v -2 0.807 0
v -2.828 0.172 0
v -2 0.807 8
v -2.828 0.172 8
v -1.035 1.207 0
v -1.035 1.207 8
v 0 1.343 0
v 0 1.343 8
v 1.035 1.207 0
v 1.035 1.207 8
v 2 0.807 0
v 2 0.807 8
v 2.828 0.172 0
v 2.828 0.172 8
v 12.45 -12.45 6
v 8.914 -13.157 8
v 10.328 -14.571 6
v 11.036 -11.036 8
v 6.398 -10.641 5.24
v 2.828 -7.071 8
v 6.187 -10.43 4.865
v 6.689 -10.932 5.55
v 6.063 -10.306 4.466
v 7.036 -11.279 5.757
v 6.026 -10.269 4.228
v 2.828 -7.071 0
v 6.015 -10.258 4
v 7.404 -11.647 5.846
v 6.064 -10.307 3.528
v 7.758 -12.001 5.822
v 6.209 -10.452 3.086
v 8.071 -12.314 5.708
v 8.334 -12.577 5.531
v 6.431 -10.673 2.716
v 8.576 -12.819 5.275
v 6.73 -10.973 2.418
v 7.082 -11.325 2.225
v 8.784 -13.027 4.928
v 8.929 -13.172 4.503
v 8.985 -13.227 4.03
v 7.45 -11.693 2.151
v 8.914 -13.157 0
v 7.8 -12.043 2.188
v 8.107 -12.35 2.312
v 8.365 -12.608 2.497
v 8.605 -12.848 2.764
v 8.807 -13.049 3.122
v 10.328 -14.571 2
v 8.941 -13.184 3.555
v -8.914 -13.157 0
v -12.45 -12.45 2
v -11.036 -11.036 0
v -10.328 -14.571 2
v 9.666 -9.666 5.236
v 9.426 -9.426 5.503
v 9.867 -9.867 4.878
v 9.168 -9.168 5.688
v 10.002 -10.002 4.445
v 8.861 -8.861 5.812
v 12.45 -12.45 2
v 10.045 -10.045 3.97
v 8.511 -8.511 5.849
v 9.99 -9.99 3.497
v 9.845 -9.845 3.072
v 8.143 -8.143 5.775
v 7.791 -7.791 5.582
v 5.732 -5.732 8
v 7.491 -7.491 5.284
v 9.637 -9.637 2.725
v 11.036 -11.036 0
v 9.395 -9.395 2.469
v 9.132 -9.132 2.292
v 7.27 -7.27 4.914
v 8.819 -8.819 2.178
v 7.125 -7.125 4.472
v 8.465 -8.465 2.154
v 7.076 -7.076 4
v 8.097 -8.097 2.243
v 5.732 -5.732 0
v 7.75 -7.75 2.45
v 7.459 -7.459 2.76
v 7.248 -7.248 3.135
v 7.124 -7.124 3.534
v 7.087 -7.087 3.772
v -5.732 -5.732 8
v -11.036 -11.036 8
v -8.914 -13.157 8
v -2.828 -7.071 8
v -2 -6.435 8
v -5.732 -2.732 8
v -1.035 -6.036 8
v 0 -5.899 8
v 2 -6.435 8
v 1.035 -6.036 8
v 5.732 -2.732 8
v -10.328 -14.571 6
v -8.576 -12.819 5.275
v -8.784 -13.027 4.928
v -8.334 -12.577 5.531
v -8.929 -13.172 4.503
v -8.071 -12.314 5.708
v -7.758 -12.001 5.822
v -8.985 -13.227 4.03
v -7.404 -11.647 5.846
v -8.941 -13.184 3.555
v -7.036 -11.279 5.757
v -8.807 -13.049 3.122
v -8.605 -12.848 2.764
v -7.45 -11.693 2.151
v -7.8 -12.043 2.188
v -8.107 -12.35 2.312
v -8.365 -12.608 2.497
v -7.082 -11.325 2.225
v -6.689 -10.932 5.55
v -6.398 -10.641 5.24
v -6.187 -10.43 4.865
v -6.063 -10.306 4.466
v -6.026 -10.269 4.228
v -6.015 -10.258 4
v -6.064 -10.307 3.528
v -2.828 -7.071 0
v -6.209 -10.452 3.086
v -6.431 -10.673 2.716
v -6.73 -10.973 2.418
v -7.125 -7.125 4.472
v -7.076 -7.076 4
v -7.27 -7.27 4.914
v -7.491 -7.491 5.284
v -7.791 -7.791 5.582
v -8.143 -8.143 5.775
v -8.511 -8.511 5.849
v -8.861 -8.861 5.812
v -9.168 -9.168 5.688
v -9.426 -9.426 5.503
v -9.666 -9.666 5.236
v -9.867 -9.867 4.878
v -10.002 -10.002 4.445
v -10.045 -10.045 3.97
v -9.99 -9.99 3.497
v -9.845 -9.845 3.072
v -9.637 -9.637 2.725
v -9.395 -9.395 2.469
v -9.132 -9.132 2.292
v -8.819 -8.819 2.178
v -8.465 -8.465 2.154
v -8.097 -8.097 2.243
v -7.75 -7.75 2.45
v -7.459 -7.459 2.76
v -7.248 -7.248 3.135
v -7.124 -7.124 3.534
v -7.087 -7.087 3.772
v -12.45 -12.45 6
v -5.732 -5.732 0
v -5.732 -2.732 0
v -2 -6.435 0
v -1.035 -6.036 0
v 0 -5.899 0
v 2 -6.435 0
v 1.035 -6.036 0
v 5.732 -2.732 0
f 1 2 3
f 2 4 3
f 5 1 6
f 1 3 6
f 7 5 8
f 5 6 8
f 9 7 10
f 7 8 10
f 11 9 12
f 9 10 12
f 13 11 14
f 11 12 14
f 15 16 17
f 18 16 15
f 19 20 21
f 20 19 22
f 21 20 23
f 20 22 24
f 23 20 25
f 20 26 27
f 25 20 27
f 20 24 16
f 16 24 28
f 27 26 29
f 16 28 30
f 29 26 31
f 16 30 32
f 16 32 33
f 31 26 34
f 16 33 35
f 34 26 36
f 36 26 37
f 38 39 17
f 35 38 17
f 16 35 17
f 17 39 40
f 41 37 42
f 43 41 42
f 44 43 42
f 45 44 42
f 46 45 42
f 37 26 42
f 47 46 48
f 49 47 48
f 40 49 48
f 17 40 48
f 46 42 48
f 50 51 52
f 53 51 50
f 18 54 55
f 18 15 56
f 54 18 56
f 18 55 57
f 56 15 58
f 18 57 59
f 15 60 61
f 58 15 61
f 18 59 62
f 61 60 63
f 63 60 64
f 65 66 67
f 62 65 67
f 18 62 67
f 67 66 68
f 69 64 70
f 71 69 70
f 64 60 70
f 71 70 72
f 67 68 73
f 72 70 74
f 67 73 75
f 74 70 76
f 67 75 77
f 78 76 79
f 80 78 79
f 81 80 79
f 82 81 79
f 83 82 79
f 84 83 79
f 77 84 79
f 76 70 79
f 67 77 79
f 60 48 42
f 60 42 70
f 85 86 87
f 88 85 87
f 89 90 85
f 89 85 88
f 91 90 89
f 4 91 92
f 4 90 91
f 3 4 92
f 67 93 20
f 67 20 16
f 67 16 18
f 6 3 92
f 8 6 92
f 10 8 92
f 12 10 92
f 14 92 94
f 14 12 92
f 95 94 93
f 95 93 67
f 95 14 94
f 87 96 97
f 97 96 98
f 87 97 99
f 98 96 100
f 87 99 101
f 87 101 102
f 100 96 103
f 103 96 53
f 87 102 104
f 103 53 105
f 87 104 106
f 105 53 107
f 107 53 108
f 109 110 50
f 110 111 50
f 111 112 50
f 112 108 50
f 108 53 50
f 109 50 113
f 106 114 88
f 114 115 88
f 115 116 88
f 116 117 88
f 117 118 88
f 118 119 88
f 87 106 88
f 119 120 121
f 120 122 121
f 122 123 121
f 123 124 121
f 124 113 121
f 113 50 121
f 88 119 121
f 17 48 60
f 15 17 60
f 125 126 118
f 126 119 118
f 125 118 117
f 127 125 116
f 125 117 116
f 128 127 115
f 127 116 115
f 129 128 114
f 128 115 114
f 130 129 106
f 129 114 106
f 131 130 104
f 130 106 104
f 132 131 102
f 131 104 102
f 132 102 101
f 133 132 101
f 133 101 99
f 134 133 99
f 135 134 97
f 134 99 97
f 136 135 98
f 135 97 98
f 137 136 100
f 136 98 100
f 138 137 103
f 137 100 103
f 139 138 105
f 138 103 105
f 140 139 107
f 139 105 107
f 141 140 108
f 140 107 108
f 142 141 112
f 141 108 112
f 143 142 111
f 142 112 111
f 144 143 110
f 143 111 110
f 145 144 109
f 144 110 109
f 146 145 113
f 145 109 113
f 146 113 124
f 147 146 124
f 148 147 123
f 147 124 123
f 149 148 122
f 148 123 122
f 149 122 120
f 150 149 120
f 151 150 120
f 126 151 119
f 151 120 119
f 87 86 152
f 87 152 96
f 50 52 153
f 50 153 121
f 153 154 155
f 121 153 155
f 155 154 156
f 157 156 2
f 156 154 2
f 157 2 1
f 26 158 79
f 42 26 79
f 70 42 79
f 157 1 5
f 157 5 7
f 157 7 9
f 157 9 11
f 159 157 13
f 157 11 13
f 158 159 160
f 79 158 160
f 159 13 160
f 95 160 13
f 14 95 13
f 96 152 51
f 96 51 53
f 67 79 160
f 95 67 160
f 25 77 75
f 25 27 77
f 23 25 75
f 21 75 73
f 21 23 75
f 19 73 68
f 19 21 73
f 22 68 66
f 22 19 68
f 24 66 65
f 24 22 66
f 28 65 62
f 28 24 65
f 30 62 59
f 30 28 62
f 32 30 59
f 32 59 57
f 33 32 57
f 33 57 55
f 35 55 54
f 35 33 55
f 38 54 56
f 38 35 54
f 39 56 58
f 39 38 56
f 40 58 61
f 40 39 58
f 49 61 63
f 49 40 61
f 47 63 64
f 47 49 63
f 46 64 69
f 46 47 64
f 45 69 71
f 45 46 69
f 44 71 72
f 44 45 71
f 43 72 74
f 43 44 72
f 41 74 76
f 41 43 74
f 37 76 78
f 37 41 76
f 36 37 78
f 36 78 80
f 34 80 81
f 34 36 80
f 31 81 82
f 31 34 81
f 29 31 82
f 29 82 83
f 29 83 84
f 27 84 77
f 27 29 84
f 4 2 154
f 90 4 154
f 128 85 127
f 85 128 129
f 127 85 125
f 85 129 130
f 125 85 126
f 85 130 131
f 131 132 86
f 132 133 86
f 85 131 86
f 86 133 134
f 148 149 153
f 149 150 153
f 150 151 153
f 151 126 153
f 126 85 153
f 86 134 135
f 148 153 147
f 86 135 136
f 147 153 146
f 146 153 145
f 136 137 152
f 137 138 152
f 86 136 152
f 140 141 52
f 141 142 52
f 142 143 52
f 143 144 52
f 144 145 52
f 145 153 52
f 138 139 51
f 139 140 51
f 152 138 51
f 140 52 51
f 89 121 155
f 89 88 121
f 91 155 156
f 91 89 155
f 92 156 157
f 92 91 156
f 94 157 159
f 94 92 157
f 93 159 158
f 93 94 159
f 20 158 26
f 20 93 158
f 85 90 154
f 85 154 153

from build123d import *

# Parameters (mm, degrees)
F1_DEPTH = 8
F6_R     = 4
F7_SIZE  = 2


with BuildPart() as f1:
    # F0 (on Top) → F1 (new body)
    with BuildSketch(Plane.XY):
        Polygon((5.732233047, -5.732233047), (0, 0), (-5.732233047, -5.732233047), (-12.4497474683, -12.4497474683), (-10.3284271247, -14.5710678119), (0, -4.2426406871), (10.3284271247, -14.5710678119), (12.4497474683, -12.4497474683), align=None)
        Polygon((-5.732233047, -5.732233047), (0, 0), (5.732233047, -5.732233047), (5.732233047, -2.732233047), (0, 3), (-5.732233047, -2.732233047), align=None)
    extrude(amount=F1_DEPTH)

    # F3 (on face) → F4 section 0
    with BuildSketch(Plane(origin=(0, 0, 0), x_dir=(-0.7071067812, 0.7071067812, 0), z_dir=(0.7071067812, 0.7071067812, 0))):
        with BuildLine():
            add(Edge.make_bspline(
                [(-10.0066017178, 4), (-10.0066017178, 7.204293994), (-13.1566017178, 5.602146997), (-16.3066017178, 4), (-13.1566017178, 2.397853003), (-10.0066017178, 0.795706006), (-10.0066017178, 4)],
                knots=[0, 0, 0, 2.0943951024, 2.0943951024, 4.1887902048, 4.1887902048, 6.2831853072, 6.2831853072, 6.2831853072], degree=2, weights=[1, 0.5, 1, 0.5, 1, 0.5, 1]))
        make_face()
    # F2 (on face) → F4 section 1
    with BuildSketch(Plane(origin=(-2.1213203436, -2.1213203436, 0), x_dir=(0.7071067812, -0.7071067812, 0), z_dir=(-0.7071067812, -0.7071067812, 0))):
        with BuildLine():
            add(Edge.make_bspline(
                [(11.5066017178, 4), (11.5066017178, 0.795706006), (14.6566017178, 2.397853003), (17.8066017178, 4), (14.6566017178, 5.602146997), (11.5066017178, 7.204293994), (11.5066017178, 4)],
                knots=[0, 0, 0, 2.0943951024, 2.0943951024, 4.1887902048, 4.1887902048, 6.2831853072, 6.2831853072, 6.2831853072], degree=2, weights=[1, 0.5, 1, 0.5, 1, 0.5, 1]))
        make_face()
    f4 = loft(mode=Mode.SUBTRACT)

    # F5: F4 across plane
    add(f4.mirror(Plane.YZ), mode=Mode.SUBTRACT)

    # F6
    f6_edges = [f1.edges().sort_by_distance(p)[0] for p in [
        (0, -4.242641, 4),
        (0, 3, 4),
    ]]
    fillet(f6_edges, radius=F6_R)

    # F7
    f7_edges = [f1.edges().sort_by_distance(p)[0] for p in [
        (11.389087, -13.510408, 8),
        (11.389087, -13.510408, 0),
        (-11.389087, -13.510408, 8),
        (-11.389087, -13.510408, 0),
    ]]
    chamfer(f7_edges, length=F7_SIZE)


solid = f1.part
